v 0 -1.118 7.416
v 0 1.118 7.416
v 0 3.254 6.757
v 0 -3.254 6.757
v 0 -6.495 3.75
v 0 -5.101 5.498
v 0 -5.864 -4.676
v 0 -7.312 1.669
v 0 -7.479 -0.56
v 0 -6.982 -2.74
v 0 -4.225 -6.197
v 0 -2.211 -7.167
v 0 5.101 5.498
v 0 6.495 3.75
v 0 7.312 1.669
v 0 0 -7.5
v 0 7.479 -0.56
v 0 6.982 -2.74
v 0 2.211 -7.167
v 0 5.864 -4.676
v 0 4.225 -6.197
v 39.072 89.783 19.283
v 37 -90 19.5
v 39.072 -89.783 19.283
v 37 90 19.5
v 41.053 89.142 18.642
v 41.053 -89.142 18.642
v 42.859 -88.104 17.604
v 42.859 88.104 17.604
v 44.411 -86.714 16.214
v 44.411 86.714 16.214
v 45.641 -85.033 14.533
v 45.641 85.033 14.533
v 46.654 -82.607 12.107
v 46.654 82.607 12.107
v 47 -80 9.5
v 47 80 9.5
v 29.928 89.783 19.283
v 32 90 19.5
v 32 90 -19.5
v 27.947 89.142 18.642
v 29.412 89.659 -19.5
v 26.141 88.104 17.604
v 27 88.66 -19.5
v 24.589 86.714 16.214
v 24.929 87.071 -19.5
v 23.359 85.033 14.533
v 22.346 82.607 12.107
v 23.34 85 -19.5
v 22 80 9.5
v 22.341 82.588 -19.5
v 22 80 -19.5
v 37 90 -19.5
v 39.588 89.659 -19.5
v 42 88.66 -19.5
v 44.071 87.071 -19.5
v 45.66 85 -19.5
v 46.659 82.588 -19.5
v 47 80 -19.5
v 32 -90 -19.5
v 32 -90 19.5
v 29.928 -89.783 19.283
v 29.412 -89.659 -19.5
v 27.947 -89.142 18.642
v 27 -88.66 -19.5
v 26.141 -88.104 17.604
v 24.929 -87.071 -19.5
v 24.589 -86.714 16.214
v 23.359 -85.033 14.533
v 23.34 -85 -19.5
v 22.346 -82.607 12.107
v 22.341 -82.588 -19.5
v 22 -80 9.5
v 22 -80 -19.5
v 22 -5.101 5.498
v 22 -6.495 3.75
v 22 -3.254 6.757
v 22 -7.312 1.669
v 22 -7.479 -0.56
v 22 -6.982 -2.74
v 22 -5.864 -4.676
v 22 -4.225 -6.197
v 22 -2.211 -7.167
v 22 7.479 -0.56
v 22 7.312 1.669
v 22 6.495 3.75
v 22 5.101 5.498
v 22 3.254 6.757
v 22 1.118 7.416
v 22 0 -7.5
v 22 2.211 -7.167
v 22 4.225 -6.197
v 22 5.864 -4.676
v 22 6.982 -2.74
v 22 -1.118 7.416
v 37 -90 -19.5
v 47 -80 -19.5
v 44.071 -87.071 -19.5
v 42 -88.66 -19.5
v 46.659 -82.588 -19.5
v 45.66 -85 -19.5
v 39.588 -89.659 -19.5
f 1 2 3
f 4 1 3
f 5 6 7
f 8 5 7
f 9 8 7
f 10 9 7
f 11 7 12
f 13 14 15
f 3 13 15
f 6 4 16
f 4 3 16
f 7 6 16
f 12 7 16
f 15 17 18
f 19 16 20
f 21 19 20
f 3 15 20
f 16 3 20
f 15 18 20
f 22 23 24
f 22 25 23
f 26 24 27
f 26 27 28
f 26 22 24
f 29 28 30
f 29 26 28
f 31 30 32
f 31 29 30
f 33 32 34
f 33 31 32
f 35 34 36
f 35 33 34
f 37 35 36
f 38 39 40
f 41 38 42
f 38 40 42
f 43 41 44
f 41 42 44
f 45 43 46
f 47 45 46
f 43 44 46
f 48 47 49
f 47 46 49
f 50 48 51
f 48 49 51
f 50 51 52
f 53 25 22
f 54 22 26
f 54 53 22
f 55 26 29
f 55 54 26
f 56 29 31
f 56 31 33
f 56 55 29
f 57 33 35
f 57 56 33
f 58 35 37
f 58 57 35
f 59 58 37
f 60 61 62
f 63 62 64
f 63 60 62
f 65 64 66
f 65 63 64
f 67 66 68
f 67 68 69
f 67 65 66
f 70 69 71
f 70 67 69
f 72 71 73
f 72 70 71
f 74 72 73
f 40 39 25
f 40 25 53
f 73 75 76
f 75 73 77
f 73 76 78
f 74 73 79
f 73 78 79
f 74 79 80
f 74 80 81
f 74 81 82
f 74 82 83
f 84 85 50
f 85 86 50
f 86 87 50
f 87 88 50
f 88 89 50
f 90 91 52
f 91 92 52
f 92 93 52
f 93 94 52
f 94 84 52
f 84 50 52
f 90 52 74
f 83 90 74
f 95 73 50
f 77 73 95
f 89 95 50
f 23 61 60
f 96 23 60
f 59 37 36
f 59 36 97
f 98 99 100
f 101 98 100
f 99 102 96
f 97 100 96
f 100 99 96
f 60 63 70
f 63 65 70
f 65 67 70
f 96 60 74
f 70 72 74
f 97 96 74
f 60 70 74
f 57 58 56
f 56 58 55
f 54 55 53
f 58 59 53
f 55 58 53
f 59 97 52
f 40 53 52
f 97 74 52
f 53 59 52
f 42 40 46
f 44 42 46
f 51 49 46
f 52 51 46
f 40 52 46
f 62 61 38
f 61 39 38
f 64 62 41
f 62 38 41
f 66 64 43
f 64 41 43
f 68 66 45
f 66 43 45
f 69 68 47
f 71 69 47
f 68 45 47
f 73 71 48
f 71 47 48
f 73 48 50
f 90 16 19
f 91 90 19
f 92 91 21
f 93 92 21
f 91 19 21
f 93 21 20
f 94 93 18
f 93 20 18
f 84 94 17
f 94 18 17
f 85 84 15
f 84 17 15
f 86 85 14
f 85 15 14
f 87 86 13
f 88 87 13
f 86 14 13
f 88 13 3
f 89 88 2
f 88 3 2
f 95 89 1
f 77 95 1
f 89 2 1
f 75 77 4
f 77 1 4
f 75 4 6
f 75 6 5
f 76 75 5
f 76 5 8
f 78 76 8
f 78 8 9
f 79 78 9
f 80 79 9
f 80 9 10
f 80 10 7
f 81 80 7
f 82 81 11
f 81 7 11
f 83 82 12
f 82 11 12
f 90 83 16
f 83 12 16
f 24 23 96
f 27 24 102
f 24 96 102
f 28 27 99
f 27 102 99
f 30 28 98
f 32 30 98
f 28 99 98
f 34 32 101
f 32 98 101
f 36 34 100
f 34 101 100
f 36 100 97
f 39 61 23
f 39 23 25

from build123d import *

# Parameters (mm, degrees)
SKETCH1_R           = 7.499999986
BOSS_EXTRUDE1_DEPTH = 22
SKETCH2_W           = 39
SKETCH2_H           = 180
BOSS_EXTRUDE2_DEPTH = 25
FILLET1_R           = 10


with BuildPart() as part:
    # Sketch1 → Boss-Extrude1 (new body)
    with BuildSketch(Plane(origin=(0, 0, 0), x_dir=(0, 0, -1), z_dir=(1, 0, 0))):
        Circle(SKETCH1_R)
    extrude(amount=BOSS_EXTRUDE1_DEPTH)

    # Sketch2 → Boss-Extrude2 (add)
    with BuildSketch(Plane(origin=(22, 0, 0), x_dir=(0, 0, -1), z_dir=(1, 0, 0))):
        Rectangle(SKETCH2_W, SKETCH2_H)
    extrude(amount=BOSS_EXTRUDE2_DEPTH)

    # Fillet1
    fillet1_edges = [part.edges().sort_by_distance(p)[0] for p in [
        (22, 0, 19.5),
        (22, -90, 0),
        (22, 90, 0),
        (47, 0, 19.5),
        (47, -90, 0),
        (47, 90, 0),
    ]]
    fillet(fillet1_edges, radius=FILLET1_R)


solid = part.part
